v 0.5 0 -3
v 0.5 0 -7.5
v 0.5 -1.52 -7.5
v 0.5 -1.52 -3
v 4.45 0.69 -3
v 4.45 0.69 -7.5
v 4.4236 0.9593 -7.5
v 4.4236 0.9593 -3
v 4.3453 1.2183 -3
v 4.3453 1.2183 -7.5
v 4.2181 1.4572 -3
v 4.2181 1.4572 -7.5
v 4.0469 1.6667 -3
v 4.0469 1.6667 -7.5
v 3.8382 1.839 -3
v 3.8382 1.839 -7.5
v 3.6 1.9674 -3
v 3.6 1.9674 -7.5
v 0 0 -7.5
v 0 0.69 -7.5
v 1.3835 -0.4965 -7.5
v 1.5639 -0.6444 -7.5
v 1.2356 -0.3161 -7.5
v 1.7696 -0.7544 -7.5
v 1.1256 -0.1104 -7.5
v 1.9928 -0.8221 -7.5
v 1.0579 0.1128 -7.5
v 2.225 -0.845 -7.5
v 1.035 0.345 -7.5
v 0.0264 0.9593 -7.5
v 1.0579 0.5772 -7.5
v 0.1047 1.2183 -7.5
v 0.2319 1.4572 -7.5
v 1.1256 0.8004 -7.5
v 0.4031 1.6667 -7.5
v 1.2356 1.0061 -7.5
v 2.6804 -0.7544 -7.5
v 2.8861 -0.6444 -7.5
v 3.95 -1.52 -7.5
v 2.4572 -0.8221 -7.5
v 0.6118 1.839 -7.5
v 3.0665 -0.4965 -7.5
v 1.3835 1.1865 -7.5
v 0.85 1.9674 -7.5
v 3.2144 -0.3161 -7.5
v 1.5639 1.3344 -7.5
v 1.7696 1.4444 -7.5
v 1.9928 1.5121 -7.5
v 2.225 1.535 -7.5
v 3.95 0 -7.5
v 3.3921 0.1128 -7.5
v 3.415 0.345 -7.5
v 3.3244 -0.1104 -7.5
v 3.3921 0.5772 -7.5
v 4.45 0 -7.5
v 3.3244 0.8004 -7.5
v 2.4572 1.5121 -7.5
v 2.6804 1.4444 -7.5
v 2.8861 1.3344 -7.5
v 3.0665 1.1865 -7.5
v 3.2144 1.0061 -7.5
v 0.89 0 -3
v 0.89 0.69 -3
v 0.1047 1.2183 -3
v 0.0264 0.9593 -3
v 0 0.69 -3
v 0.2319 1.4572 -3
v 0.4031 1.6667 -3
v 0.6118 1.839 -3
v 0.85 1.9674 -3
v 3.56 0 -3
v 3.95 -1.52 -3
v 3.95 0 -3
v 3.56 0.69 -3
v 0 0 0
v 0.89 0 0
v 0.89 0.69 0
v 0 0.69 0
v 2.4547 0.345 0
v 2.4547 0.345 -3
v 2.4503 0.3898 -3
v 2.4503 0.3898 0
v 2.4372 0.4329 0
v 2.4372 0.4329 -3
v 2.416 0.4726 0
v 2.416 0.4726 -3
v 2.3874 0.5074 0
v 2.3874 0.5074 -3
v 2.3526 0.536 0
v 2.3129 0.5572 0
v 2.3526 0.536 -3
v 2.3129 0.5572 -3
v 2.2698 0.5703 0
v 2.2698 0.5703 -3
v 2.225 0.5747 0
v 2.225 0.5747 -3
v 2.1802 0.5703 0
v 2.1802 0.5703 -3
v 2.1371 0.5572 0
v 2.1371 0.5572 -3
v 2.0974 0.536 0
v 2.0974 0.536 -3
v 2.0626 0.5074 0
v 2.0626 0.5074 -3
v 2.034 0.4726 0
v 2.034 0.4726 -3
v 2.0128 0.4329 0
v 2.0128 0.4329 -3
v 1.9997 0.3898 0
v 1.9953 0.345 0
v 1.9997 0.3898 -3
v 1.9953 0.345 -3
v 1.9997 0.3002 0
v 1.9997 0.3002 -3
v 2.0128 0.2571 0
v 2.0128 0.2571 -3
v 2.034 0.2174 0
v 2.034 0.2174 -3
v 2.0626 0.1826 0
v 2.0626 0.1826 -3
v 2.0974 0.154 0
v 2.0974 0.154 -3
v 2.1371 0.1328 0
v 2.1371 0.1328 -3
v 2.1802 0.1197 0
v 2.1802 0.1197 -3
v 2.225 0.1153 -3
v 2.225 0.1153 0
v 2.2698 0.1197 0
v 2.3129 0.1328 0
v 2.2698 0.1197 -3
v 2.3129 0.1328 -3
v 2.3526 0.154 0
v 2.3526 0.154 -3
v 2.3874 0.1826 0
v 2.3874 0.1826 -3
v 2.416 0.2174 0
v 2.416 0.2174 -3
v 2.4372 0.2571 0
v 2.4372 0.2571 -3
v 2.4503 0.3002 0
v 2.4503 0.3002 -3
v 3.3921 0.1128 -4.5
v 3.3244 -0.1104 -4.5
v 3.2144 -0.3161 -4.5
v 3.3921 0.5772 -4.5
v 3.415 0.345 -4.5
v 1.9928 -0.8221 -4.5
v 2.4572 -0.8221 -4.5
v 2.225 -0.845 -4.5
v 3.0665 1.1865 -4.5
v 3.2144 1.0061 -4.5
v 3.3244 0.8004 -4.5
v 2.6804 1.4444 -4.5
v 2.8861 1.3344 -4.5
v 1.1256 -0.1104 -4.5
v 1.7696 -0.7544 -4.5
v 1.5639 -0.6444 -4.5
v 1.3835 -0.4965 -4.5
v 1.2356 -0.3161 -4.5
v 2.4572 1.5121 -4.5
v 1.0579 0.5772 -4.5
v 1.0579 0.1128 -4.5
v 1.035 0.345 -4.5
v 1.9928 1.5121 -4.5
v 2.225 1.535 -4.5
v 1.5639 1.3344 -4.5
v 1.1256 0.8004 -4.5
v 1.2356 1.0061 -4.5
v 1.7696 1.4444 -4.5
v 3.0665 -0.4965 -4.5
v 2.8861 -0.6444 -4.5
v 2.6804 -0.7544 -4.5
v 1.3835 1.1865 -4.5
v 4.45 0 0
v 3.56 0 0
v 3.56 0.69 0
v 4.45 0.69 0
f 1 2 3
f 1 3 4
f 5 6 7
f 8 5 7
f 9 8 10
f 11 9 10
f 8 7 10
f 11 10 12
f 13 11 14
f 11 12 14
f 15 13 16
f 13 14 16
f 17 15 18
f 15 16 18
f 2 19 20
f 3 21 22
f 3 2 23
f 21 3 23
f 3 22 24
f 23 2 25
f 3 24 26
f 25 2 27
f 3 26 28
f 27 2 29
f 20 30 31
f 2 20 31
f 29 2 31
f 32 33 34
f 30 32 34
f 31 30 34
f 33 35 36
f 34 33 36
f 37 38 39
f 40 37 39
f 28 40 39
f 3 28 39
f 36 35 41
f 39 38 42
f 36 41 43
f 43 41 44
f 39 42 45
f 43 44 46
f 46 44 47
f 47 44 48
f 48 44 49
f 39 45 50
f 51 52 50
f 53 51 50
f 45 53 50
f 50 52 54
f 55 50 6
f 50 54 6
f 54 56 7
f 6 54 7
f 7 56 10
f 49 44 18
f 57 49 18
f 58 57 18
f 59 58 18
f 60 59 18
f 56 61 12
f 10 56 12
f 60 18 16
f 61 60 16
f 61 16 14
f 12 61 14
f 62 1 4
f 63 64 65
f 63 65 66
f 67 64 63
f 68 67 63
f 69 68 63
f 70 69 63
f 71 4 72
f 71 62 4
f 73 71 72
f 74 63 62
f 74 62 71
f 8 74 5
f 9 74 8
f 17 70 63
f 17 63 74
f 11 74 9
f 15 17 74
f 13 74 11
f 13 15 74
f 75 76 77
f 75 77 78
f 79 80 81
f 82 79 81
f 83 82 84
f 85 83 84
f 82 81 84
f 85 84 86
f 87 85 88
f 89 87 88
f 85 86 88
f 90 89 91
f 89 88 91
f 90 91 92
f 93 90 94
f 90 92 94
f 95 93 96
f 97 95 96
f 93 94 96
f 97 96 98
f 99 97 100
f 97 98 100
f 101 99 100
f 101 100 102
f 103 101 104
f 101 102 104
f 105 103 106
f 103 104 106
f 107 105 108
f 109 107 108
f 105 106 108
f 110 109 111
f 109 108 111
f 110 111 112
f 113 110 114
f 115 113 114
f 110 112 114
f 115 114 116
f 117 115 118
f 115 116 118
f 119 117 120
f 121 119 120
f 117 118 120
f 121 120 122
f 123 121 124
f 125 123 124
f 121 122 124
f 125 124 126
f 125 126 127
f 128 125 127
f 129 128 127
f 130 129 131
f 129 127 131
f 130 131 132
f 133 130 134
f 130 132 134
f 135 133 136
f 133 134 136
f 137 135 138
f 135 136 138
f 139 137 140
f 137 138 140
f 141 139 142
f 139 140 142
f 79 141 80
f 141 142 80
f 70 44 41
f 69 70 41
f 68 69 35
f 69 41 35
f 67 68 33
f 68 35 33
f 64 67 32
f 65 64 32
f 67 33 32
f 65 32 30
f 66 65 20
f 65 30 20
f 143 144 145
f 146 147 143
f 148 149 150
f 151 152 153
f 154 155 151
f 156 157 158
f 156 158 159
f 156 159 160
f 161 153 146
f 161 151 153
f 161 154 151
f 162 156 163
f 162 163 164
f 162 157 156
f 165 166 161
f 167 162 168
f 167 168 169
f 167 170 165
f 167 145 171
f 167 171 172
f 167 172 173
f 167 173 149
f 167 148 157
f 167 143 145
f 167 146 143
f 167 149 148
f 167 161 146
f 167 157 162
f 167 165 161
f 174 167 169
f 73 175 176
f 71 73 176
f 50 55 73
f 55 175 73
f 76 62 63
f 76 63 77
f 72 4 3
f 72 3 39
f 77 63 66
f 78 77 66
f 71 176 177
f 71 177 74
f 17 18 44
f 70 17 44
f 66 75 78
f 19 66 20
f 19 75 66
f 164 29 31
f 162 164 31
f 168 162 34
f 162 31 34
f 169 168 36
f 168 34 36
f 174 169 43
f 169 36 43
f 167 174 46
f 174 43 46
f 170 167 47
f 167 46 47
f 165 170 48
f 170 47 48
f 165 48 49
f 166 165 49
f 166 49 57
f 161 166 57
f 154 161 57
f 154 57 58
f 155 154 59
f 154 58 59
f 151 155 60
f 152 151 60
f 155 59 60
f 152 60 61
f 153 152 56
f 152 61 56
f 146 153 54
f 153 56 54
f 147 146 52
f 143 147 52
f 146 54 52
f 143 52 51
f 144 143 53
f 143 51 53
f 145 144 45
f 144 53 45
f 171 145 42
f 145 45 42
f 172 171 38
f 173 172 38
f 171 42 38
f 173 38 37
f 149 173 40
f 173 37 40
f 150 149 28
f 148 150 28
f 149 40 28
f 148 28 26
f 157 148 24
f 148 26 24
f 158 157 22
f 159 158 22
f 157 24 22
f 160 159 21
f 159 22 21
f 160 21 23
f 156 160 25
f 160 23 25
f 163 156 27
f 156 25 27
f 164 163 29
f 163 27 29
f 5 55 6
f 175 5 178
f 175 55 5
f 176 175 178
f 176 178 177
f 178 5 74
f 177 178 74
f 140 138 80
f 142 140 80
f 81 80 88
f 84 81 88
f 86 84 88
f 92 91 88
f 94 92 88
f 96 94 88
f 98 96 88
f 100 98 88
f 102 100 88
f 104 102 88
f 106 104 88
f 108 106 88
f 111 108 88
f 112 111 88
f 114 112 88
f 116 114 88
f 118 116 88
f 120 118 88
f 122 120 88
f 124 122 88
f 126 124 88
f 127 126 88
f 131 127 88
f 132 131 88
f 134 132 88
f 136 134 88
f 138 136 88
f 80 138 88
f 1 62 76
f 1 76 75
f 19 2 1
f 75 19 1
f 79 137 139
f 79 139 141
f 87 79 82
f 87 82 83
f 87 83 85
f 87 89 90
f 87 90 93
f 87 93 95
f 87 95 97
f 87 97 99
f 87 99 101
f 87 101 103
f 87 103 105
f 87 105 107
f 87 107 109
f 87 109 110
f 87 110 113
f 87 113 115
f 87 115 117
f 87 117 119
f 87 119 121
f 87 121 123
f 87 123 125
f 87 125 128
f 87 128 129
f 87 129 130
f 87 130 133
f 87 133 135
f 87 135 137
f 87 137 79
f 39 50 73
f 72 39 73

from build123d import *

# Parameters (mm, degrees)
BOSS_EXTRUDE2_DEPTH = 0.69
SKETCH3_W           = 3.45
SKETCH3_H           = 4.5
BOSS_EXTRUDE3_DEPTH = 1.52
SKETCH4_R           = 0.229716396
BOSS_EXTRUDE4_DEPTH = 3
BOSS_EXTRUDE5_DEPTH = 4.5
SKETCH6_R           = 1.19
CUT_EXTRUDE1_DEPTH  = 3


with BuildPart() as part:
    # Sketch1 → Boss-Extrude2 (new body)
    with BuildSketch(Plane(origin=(0, 0, 0), x_dir=(1, 0, 0), z_dir=(0, 1, 0))):
        Polygon((0.89, 3), (0.89, 0), (0, 0), (0, 7.5), (4.45, 7.5), (4.45, 0), (3.56, 0), (3.56, 3), align=None)
    extrude(amount=BOSS_EXTRUDE2_DEPTH)

    # Sketch3 → Boss-Extrude3 (add)
    with BuildSketch(Plane.XZ):
        with Locations((2.225, -5.25)):
            Rectangle(SKETCH3_W, SKETCH3_H)
    extrude(amount=BOSS_EXTRUDE3_DEPTH)

    # Sketch5 → Boss-Extrude5 (add)
    with BuildSketch(Plane(origin=(0, 0, -7.5), x_dir=(-1, 0, 0), z_dir=(0, 0, -1))):
        with BuildLine():
            Line((-3.6, 1.967420132), (-0.85, 1.967420132))
            ThreePointArc((-0.85, 1.967420132), (-0.231919135, 1.457186776), (0, 0.69))
            Line((0, 0.69), (-4.45, 0.69))
            ThreePointArc((-4.45, 0.69), (-4.218080865, 1.457186776), (-3.6, 1.967420132))
        make_face()
    extrude(amount=-BOSS_EXTRUDE5_DEPTH)

    # Sketch6 → Cut-Extrude1 (cut)
    with BuildSketch(Plane(origin=(0, 0, -7.5), x_dir=(-1, 0, 0), z_dir=(0, 0, -1))):
        with Locations((-2.225, 0.345)):
            Circle(SKETCH6_R)
    extrude(amount=-CUT_EXTRUDE1_DEPTH, mode=Mode.SUBTRACT)


with BuildPart() as body_2:
    # Sketch4 → Boss-Extrude4 (new body)
    with BuildSketch(Plane.XY.offset(-3)):
        with Locations((2.225, 0.345)):
            Circle(SKETCH4_R)
    extrude(amount=BOSS_EXTRUDE4_DEPTH)


solid = Compound([part.part, body_2.part])
